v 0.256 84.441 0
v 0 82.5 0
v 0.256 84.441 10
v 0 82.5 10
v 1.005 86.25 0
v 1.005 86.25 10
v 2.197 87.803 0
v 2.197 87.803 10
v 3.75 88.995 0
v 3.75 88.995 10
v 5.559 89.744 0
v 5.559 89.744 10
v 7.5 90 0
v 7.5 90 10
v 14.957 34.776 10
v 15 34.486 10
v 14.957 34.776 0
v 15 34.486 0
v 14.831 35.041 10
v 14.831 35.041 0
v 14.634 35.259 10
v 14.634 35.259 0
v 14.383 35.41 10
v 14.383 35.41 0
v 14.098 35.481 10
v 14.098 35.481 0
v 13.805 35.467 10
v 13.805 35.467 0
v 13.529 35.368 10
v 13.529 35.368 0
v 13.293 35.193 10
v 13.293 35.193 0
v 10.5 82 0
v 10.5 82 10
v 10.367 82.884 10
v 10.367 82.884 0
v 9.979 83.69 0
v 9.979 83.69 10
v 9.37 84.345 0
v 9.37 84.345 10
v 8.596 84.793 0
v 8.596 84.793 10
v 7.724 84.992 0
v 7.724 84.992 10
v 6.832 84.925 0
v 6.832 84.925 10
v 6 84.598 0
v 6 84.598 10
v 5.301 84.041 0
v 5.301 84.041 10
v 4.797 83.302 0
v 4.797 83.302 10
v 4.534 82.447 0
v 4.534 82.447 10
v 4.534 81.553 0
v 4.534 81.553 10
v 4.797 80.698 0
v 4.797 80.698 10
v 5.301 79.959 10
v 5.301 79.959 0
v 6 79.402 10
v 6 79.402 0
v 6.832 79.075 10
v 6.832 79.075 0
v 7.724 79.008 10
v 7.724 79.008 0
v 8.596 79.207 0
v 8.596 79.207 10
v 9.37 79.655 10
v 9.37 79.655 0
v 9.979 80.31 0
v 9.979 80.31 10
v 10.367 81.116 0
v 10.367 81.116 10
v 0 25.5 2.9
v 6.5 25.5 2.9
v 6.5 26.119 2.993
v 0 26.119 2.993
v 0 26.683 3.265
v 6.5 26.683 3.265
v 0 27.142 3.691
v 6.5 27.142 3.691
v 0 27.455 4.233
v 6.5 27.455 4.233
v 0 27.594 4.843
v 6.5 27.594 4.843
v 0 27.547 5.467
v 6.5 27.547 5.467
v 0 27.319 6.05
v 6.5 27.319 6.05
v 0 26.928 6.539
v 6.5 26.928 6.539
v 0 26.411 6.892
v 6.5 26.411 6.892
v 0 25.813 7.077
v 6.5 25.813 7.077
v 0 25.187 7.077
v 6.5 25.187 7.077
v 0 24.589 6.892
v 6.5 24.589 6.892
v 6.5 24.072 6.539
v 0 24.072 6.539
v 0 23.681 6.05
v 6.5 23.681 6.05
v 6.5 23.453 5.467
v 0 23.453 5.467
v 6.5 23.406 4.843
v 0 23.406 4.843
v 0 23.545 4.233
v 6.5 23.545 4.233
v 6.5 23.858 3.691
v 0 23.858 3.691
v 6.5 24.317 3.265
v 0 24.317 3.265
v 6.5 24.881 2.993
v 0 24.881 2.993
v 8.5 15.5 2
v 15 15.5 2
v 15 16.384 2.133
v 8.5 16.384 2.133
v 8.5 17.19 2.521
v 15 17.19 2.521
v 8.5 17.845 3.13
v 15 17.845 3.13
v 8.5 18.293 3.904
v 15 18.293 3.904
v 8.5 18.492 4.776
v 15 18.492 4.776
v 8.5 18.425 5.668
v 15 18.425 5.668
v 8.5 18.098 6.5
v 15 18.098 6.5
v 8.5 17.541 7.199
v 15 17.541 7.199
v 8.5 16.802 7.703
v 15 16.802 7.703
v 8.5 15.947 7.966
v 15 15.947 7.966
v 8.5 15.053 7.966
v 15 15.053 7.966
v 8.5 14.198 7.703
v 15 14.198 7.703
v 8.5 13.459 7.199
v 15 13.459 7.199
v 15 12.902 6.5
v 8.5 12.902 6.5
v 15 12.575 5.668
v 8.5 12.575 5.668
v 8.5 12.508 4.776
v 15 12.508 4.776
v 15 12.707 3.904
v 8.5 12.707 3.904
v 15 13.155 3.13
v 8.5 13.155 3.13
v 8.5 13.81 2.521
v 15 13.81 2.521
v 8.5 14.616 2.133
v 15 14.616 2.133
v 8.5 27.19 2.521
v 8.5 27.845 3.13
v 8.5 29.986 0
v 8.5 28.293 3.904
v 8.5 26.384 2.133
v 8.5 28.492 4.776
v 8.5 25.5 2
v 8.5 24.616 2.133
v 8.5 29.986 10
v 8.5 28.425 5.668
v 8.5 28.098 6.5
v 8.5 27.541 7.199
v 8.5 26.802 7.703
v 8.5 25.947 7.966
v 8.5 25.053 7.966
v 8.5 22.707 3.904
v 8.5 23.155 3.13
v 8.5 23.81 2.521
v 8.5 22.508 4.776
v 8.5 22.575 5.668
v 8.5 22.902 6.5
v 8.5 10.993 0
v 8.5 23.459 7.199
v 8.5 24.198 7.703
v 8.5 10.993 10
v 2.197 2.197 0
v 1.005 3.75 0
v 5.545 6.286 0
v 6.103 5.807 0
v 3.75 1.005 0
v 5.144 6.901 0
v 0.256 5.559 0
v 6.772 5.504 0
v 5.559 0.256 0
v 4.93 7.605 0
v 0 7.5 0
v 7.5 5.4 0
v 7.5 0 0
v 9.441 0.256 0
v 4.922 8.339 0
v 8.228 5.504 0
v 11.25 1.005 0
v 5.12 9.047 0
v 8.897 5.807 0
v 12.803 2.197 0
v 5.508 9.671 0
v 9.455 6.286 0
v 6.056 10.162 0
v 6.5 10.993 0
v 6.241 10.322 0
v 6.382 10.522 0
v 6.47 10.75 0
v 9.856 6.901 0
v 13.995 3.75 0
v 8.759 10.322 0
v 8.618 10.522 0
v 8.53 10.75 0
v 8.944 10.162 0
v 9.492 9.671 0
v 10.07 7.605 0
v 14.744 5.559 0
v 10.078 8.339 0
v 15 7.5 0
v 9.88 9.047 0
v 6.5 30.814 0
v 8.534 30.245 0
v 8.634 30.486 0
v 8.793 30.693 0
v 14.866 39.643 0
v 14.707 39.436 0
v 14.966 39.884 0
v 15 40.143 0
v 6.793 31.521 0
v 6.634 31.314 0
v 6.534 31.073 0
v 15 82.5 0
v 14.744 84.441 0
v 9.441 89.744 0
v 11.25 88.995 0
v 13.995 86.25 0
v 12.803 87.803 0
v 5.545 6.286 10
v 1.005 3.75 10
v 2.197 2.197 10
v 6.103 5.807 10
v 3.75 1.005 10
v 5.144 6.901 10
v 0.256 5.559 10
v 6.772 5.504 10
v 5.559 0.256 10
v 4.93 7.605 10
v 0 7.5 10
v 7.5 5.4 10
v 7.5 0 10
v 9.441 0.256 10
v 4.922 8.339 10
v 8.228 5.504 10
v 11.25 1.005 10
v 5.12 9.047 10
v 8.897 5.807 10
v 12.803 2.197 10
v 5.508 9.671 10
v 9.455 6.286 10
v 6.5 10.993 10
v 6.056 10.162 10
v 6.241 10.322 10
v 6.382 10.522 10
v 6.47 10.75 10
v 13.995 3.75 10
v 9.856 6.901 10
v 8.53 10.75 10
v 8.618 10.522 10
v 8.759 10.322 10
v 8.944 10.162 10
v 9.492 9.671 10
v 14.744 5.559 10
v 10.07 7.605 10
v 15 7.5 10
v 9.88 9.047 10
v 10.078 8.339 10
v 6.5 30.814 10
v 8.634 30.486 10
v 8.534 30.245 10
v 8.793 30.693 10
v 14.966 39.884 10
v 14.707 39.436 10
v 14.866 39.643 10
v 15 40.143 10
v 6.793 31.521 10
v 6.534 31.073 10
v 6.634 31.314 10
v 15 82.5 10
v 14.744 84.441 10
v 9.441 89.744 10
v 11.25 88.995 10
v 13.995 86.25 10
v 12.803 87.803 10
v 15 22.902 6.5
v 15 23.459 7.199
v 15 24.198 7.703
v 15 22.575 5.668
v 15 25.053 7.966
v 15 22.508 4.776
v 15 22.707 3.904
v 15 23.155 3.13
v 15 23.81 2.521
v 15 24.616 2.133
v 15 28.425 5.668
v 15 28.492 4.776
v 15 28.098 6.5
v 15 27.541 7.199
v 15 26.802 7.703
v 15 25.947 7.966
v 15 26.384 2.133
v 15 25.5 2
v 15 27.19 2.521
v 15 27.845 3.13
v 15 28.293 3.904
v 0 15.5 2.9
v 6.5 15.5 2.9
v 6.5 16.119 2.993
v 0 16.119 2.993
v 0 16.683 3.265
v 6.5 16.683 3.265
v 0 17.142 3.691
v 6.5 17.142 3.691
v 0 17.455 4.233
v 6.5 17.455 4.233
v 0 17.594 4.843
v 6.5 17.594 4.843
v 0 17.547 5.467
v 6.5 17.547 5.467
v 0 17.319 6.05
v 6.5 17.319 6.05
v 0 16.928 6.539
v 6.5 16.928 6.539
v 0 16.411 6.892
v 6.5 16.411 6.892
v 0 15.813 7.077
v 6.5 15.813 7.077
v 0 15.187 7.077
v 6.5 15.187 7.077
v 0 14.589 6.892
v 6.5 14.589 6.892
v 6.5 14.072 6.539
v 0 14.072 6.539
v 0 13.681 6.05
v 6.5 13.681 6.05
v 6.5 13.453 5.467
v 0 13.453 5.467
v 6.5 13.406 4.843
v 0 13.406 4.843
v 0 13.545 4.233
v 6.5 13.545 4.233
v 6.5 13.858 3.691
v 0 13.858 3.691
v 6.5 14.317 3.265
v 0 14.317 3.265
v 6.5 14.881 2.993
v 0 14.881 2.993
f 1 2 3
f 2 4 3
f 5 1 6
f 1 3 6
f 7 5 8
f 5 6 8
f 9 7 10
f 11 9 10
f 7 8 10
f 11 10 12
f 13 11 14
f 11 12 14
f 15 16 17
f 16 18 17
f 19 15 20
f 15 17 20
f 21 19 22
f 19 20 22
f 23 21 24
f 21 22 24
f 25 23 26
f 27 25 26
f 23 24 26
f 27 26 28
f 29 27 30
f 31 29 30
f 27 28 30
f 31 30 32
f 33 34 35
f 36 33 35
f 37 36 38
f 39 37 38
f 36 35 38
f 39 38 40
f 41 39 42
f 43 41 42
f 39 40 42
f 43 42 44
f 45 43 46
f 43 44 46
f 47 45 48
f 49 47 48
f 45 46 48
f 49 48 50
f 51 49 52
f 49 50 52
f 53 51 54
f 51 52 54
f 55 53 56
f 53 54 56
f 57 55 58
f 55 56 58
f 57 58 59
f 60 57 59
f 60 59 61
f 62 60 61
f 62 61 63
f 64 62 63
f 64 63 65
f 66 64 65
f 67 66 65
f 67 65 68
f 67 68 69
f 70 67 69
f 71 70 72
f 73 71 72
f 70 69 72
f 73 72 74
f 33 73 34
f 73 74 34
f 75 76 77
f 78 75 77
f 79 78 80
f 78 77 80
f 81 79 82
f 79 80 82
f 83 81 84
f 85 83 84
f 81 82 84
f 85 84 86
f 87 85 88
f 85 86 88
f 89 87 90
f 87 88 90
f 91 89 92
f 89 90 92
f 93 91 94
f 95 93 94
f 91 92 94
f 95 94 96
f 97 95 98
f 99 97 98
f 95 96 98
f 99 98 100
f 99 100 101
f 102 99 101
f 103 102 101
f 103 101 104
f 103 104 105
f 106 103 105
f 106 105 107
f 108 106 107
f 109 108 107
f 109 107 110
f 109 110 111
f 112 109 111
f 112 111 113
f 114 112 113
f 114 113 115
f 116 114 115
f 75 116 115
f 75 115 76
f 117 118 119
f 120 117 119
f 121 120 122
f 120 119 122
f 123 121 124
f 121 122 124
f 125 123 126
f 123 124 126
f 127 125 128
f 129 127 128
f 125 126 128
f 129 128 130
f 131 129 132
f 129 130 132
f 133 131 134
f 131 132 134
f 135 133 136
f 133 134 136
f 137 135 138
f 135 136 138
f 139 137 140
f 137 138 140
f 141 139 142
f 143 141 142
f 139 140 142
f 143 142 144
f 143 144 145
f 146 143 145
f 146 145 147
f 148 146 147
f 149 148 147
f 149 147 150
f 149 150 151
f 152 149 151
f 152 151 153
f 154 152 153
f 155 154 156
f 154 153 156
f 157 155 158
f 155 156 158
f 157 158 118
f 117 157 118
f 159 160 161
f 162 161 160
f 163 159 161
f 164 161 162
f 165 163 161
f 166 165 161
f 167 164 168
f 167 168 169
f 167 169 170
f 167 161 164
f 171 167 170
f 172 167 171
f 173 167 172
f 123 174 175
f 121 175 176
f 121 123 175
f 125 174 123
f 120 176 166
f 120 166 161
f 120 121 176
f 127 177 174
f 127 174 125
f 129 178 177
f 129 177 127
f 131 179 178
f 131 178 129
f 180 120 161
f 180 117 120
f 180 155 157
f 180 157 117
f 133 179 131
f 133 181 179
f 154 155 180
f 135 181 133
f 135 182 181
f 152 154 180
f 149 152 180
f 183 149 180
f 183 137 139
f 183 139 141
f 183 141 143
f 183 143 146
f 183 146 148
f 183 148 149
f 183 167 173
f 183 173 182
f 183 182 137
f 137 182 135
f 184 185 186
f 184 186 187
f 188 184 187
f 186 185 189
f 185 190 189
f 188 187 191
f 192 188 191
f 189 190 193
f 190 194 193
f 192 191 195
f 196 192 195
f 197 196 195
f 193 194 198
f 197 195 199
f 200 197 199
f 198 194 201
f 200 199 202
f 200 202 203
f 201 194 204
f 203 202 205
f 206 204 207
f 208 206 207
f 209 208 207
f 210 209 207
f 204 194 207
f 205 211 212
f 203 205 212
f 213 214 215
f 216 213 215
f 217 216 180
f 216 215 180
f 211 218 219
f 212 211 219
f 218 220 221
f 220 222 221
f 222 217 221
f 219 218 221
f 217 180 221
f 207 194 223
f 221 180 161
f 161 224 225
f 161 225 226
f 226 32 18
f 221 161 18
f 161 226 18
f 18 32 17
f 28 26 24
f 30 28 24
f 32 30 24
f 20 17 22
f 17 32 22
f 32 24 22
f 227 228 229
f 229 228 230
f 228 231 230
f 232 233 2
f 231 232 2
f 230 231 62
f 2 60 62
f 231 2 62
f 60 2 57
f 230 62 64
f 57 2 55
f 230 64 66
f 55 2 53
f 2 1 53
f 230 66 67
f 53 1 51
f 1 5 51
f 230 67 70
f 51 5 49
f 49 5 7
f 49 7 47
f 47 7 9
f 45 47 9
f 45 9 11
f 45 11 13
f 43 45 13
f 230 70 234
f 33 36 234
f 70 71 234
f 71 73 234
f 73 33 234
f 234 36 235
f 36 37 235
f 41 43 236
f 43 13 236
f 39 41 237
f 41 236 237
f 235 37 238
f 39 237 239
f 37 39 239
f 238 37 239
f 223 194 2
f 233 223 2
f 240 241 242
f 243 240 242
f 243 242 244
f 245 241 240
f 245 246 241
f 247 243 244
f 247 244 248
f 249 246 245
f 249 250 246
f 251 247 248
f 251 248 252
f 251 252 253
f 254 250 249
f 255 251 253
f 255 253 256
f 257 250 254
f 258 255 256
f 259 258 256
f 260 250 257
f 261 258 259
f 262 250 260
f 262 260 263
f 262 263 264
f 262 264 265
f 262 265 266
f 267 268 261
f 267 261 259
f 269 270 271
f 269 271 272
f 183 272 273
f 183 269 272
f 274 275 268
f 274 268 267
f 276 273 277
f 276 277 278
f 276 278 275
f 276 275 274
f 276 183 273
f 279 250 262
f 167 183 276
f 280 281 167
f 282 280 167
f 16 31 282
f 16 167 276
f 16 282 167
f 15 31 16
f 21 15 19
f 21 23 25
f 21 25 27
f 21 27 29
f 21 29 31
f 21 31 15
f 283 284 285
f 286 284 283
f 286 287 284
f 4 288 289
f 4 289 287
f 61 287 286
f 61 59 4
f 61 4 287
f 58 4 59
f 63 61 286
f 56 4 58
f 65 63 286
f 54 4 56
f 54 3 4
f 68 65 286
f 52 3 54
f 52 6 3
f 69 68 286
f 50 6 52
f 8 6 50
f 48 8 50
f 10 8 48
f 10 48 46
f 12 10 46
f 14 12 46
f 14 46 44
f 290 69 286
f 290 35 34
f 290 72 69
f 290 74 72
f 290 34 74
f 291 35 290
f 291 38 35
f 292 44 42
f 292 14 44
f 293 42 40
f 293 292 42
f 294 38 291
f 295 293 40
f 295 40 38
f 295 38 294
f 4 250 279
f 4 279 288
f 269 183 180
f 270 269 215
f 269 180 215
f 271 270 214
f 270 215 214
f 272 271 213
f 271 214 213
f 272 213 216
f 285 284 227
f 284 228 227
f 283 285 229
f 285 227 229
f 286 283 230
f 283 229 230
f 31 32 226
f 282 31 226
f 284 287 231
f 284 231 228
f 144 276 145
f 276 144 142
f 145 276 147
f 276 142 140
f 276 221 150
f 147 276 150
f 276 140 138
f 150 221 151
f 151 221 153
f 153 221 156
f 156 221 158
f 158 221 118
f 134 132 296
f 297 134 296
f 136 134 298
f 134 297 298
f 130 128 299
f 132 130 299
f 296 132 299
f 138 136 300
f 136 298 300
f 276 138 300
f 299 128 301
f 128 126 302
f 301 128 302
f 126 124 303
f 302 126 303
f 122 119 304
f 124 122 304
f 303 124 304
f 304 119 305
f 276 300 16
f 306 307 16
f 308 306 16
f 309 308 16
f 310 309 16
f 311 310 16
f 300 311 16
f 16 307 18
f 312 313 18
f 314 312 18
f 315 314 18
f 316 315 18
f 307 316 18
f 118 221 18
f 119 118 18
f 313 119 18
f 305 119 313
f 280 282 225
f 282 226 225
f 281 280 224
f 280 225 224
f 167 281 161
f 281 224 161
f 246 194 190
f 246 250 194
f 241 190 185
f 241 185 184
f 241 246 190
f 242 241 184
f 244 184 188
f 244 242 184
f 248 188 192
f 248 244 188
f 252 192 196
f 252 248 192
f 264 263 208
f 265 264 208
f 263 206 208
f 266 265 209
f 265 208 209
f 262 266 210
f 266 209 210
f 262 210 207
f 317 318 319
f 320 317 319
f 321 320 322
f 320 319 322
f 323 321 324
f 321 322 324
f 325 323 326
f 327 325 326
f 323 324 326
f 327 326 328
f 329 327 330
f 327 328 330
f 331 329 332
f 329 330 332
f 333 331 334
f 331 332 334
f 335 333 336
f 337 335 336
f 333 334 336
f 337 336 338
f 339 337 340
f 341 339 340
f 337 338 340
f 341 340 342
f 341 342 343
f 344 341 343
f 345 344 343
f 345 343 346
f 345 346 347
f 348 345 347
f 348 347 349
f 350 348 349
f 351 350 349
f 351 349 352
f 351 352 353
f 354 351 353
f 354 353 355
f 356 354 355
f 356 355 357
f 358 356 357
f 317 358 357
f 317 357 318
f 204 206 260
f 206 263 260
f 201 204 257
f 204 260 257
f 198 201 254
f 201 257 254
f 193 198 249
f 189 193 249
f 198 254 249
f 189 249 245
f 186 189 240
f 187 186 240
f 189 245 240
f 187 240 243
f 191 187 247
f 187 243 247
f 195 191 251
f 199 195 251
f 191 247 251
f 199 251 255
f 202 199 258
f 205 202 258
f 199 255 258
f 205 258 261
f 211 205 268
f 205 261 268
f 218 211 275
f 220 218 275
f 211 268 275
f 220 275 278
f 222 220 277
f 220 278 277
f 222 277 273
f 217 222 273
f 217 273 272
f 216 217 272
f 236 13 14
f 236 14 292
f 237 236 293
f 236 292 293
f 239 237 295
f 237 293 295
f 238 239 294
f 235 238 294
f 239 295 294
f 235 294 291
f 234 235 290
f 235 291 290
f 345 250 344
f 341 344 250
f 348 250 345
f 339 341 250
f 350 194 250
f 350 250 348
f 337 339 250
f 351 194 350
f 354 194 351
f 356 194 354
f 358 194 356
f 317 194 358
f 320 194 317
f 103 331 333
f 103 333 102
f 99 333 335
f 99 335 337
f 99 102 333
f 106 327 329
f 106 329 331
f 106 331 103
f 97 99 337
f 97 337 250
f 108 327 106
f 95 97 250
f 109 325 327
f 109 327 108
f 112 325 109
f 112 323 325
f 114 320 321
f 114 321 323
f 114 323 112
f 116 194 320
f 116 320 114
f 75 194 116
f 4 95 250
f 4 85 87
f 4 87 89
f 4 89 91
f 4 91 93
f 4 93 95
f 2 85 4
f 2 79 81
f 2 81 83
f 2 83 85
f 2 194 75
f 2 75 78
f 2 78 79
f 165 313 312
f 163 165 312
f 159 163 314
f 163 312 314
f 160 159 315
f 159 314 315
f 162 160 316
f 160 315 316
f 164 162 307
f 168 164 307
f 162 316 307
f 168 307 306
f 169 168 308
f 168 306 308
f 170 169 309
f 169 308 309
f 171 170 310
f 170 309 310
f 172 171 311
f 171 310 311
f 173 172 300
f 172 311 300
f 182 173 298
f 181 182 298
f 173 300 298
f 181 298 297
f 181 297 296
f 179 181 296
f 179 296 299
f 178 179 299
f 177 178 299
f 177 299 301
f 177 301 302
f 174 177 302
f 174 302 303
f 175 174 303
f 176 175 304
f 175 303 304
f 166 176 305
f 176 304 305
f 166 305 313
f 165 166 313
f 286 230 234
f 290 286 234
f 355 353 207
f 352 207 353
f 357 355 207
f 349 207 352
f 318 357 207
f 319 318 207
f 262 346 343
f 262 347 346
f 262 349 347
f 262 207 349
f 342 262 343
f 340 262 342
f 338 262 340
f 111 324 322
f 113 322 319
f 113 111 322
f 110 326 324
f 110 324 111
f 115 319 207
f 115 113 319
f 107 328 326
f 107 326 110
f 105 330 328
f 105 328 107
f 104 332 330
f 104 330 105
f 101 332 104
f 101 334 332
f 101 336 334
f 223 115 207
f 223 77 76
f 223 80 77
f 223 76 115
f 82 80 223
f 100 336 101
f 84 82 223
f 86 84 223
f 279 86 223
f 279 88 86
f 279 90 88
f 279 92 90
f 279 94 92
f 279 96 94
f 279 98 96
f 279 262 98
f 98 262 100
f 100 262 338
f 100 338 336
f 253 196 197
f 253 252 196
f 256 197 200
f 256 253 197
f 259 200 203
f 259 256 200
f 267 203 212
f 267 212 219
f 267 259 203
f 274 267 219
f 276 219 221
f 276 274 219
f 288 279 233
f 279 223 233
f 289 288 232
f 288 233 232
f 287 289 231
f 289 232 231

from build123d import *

# Parameters (mm, degrees)
ESQUISSE1_W             = 15
ESQUISSE1_H             = 90
BOSS_EXTRU_1_DEPTH      = 10
ESQUISSE2_R             = 3
ESQUISSE2_R_2           = 2.6
ENL_V_MAT_EXTRU_1_DEPTH = 10
CONG_1_R                = 7.5
ENL_V_MAT_EXTRU_2_DEPTH = 92.787798753
ESQUISSE4_R             = 2.1
ENL_V_MAT_EXTRU_3_DEPTH = 92.787798753
ESQUISSE5_R             = 3
ENL_V_MAT_EXTRU_4_DEPTH = 6.5
CONG_2_R                = 1


with BuildPart() as part:
    # Esquisse1 → Boss.-Extru.1 (new body)
    with BuildSketch(Plane.XY):
        with Locations((7.5, 45)):
            Rectangle(ESQUISSE1_W, ESQUISSE1_H)
    extrude(amount=BOSS_EXTRU_1_DEPTH)

    # Esquisse2 → Enlèv. mat.-Extru.1 (cut)
    with BuildSketch(Plane.XY.offset(10)):
        with Locations((7.5, 82)):
            Circle(ESQUISSE2_R)
        with Locations((7.5, 8)):
            Circle(ESQUISSE2_R_2)
    extrude(amount=-ENL_V_MAT_EXTRU_1_DEPTH, mode=Mode.SUBTRACT)

    # Congé1
    cong_1_edges = [part.edges().sort_by_distance(p)[0] for p in [
        (15, 90, 5),
        (0, 90, 5),
        (15, 0, 5),
        (0, 0, 5),
    ]]
    fillet(cong_1_edges, radius=CONG_1_R - 0.0001)  # a hair under: the kernel refuses the full size

    # Esquisse3 → Enlèv. mat.-Extru.2 (cut, through all)
    with BuildSketch(Plane.XY.offset(10)):
        Polygon((6.5, 10.4), (6.5, 31.228427125), (15, 39.728427125), (15, 36.9), (8.5, 30.4), (8.5, 10.4), align=None)
    extrude(amount=-ENL_V_MAT_EXTRU_2_DEPTH, mode=Mode.SUBTRACT)

    # Esquisse4 → Enlèv. mat.-Extru.3 (cut, through all)
    with BuildSketch(Plane(origin=(15, 0, 0), x_dir=(0, 0, -1), z_dir=(1, 0, 0))):
        with Locations((-5, 15.5)):
            Circle(ESQUISSE4_R)
        with Locations((-5, 25.5)):
            Circle(ESQUISSE4_R)
    extrude(amount=-ENL_V_MAT_EXTRU_3_DEPTH, mode=Mode.SUBTRACT)

    # Esquisse5 → Enlèv. mat.-Extru.4 (cut)
    with BuildSketch(Plane(origin=(15, 0, 0), x_dir=(0, 0, -1), z_dir=(1, 0, 0))):
        with Locations((-5, 25.5)):
            Circle(ESQUISSE5_R)
        with Locations((-5, 15.5)):
            Circle(ESQUISSE5_R)
    extrude(amount=-ENL_V_MAT_EXTRU_4_DEPTH, mode=Mode.SUBTRACT)

    # Congé2
    cong_2_edges = [part.edges().sort_by_distance(p)[0] for p in [
        (8.5, 10.4, 5),
        (6.5, 10.4, 5),
        (6.5, 31.228427125, 5),
        (15, 39.728427125, 5),
        (15, 36.9, 5),
        (8.5, 30.4, 5),
    ]]
    fillet(cong_2_edges, radius=CONG_2_R)


solid = part.part
